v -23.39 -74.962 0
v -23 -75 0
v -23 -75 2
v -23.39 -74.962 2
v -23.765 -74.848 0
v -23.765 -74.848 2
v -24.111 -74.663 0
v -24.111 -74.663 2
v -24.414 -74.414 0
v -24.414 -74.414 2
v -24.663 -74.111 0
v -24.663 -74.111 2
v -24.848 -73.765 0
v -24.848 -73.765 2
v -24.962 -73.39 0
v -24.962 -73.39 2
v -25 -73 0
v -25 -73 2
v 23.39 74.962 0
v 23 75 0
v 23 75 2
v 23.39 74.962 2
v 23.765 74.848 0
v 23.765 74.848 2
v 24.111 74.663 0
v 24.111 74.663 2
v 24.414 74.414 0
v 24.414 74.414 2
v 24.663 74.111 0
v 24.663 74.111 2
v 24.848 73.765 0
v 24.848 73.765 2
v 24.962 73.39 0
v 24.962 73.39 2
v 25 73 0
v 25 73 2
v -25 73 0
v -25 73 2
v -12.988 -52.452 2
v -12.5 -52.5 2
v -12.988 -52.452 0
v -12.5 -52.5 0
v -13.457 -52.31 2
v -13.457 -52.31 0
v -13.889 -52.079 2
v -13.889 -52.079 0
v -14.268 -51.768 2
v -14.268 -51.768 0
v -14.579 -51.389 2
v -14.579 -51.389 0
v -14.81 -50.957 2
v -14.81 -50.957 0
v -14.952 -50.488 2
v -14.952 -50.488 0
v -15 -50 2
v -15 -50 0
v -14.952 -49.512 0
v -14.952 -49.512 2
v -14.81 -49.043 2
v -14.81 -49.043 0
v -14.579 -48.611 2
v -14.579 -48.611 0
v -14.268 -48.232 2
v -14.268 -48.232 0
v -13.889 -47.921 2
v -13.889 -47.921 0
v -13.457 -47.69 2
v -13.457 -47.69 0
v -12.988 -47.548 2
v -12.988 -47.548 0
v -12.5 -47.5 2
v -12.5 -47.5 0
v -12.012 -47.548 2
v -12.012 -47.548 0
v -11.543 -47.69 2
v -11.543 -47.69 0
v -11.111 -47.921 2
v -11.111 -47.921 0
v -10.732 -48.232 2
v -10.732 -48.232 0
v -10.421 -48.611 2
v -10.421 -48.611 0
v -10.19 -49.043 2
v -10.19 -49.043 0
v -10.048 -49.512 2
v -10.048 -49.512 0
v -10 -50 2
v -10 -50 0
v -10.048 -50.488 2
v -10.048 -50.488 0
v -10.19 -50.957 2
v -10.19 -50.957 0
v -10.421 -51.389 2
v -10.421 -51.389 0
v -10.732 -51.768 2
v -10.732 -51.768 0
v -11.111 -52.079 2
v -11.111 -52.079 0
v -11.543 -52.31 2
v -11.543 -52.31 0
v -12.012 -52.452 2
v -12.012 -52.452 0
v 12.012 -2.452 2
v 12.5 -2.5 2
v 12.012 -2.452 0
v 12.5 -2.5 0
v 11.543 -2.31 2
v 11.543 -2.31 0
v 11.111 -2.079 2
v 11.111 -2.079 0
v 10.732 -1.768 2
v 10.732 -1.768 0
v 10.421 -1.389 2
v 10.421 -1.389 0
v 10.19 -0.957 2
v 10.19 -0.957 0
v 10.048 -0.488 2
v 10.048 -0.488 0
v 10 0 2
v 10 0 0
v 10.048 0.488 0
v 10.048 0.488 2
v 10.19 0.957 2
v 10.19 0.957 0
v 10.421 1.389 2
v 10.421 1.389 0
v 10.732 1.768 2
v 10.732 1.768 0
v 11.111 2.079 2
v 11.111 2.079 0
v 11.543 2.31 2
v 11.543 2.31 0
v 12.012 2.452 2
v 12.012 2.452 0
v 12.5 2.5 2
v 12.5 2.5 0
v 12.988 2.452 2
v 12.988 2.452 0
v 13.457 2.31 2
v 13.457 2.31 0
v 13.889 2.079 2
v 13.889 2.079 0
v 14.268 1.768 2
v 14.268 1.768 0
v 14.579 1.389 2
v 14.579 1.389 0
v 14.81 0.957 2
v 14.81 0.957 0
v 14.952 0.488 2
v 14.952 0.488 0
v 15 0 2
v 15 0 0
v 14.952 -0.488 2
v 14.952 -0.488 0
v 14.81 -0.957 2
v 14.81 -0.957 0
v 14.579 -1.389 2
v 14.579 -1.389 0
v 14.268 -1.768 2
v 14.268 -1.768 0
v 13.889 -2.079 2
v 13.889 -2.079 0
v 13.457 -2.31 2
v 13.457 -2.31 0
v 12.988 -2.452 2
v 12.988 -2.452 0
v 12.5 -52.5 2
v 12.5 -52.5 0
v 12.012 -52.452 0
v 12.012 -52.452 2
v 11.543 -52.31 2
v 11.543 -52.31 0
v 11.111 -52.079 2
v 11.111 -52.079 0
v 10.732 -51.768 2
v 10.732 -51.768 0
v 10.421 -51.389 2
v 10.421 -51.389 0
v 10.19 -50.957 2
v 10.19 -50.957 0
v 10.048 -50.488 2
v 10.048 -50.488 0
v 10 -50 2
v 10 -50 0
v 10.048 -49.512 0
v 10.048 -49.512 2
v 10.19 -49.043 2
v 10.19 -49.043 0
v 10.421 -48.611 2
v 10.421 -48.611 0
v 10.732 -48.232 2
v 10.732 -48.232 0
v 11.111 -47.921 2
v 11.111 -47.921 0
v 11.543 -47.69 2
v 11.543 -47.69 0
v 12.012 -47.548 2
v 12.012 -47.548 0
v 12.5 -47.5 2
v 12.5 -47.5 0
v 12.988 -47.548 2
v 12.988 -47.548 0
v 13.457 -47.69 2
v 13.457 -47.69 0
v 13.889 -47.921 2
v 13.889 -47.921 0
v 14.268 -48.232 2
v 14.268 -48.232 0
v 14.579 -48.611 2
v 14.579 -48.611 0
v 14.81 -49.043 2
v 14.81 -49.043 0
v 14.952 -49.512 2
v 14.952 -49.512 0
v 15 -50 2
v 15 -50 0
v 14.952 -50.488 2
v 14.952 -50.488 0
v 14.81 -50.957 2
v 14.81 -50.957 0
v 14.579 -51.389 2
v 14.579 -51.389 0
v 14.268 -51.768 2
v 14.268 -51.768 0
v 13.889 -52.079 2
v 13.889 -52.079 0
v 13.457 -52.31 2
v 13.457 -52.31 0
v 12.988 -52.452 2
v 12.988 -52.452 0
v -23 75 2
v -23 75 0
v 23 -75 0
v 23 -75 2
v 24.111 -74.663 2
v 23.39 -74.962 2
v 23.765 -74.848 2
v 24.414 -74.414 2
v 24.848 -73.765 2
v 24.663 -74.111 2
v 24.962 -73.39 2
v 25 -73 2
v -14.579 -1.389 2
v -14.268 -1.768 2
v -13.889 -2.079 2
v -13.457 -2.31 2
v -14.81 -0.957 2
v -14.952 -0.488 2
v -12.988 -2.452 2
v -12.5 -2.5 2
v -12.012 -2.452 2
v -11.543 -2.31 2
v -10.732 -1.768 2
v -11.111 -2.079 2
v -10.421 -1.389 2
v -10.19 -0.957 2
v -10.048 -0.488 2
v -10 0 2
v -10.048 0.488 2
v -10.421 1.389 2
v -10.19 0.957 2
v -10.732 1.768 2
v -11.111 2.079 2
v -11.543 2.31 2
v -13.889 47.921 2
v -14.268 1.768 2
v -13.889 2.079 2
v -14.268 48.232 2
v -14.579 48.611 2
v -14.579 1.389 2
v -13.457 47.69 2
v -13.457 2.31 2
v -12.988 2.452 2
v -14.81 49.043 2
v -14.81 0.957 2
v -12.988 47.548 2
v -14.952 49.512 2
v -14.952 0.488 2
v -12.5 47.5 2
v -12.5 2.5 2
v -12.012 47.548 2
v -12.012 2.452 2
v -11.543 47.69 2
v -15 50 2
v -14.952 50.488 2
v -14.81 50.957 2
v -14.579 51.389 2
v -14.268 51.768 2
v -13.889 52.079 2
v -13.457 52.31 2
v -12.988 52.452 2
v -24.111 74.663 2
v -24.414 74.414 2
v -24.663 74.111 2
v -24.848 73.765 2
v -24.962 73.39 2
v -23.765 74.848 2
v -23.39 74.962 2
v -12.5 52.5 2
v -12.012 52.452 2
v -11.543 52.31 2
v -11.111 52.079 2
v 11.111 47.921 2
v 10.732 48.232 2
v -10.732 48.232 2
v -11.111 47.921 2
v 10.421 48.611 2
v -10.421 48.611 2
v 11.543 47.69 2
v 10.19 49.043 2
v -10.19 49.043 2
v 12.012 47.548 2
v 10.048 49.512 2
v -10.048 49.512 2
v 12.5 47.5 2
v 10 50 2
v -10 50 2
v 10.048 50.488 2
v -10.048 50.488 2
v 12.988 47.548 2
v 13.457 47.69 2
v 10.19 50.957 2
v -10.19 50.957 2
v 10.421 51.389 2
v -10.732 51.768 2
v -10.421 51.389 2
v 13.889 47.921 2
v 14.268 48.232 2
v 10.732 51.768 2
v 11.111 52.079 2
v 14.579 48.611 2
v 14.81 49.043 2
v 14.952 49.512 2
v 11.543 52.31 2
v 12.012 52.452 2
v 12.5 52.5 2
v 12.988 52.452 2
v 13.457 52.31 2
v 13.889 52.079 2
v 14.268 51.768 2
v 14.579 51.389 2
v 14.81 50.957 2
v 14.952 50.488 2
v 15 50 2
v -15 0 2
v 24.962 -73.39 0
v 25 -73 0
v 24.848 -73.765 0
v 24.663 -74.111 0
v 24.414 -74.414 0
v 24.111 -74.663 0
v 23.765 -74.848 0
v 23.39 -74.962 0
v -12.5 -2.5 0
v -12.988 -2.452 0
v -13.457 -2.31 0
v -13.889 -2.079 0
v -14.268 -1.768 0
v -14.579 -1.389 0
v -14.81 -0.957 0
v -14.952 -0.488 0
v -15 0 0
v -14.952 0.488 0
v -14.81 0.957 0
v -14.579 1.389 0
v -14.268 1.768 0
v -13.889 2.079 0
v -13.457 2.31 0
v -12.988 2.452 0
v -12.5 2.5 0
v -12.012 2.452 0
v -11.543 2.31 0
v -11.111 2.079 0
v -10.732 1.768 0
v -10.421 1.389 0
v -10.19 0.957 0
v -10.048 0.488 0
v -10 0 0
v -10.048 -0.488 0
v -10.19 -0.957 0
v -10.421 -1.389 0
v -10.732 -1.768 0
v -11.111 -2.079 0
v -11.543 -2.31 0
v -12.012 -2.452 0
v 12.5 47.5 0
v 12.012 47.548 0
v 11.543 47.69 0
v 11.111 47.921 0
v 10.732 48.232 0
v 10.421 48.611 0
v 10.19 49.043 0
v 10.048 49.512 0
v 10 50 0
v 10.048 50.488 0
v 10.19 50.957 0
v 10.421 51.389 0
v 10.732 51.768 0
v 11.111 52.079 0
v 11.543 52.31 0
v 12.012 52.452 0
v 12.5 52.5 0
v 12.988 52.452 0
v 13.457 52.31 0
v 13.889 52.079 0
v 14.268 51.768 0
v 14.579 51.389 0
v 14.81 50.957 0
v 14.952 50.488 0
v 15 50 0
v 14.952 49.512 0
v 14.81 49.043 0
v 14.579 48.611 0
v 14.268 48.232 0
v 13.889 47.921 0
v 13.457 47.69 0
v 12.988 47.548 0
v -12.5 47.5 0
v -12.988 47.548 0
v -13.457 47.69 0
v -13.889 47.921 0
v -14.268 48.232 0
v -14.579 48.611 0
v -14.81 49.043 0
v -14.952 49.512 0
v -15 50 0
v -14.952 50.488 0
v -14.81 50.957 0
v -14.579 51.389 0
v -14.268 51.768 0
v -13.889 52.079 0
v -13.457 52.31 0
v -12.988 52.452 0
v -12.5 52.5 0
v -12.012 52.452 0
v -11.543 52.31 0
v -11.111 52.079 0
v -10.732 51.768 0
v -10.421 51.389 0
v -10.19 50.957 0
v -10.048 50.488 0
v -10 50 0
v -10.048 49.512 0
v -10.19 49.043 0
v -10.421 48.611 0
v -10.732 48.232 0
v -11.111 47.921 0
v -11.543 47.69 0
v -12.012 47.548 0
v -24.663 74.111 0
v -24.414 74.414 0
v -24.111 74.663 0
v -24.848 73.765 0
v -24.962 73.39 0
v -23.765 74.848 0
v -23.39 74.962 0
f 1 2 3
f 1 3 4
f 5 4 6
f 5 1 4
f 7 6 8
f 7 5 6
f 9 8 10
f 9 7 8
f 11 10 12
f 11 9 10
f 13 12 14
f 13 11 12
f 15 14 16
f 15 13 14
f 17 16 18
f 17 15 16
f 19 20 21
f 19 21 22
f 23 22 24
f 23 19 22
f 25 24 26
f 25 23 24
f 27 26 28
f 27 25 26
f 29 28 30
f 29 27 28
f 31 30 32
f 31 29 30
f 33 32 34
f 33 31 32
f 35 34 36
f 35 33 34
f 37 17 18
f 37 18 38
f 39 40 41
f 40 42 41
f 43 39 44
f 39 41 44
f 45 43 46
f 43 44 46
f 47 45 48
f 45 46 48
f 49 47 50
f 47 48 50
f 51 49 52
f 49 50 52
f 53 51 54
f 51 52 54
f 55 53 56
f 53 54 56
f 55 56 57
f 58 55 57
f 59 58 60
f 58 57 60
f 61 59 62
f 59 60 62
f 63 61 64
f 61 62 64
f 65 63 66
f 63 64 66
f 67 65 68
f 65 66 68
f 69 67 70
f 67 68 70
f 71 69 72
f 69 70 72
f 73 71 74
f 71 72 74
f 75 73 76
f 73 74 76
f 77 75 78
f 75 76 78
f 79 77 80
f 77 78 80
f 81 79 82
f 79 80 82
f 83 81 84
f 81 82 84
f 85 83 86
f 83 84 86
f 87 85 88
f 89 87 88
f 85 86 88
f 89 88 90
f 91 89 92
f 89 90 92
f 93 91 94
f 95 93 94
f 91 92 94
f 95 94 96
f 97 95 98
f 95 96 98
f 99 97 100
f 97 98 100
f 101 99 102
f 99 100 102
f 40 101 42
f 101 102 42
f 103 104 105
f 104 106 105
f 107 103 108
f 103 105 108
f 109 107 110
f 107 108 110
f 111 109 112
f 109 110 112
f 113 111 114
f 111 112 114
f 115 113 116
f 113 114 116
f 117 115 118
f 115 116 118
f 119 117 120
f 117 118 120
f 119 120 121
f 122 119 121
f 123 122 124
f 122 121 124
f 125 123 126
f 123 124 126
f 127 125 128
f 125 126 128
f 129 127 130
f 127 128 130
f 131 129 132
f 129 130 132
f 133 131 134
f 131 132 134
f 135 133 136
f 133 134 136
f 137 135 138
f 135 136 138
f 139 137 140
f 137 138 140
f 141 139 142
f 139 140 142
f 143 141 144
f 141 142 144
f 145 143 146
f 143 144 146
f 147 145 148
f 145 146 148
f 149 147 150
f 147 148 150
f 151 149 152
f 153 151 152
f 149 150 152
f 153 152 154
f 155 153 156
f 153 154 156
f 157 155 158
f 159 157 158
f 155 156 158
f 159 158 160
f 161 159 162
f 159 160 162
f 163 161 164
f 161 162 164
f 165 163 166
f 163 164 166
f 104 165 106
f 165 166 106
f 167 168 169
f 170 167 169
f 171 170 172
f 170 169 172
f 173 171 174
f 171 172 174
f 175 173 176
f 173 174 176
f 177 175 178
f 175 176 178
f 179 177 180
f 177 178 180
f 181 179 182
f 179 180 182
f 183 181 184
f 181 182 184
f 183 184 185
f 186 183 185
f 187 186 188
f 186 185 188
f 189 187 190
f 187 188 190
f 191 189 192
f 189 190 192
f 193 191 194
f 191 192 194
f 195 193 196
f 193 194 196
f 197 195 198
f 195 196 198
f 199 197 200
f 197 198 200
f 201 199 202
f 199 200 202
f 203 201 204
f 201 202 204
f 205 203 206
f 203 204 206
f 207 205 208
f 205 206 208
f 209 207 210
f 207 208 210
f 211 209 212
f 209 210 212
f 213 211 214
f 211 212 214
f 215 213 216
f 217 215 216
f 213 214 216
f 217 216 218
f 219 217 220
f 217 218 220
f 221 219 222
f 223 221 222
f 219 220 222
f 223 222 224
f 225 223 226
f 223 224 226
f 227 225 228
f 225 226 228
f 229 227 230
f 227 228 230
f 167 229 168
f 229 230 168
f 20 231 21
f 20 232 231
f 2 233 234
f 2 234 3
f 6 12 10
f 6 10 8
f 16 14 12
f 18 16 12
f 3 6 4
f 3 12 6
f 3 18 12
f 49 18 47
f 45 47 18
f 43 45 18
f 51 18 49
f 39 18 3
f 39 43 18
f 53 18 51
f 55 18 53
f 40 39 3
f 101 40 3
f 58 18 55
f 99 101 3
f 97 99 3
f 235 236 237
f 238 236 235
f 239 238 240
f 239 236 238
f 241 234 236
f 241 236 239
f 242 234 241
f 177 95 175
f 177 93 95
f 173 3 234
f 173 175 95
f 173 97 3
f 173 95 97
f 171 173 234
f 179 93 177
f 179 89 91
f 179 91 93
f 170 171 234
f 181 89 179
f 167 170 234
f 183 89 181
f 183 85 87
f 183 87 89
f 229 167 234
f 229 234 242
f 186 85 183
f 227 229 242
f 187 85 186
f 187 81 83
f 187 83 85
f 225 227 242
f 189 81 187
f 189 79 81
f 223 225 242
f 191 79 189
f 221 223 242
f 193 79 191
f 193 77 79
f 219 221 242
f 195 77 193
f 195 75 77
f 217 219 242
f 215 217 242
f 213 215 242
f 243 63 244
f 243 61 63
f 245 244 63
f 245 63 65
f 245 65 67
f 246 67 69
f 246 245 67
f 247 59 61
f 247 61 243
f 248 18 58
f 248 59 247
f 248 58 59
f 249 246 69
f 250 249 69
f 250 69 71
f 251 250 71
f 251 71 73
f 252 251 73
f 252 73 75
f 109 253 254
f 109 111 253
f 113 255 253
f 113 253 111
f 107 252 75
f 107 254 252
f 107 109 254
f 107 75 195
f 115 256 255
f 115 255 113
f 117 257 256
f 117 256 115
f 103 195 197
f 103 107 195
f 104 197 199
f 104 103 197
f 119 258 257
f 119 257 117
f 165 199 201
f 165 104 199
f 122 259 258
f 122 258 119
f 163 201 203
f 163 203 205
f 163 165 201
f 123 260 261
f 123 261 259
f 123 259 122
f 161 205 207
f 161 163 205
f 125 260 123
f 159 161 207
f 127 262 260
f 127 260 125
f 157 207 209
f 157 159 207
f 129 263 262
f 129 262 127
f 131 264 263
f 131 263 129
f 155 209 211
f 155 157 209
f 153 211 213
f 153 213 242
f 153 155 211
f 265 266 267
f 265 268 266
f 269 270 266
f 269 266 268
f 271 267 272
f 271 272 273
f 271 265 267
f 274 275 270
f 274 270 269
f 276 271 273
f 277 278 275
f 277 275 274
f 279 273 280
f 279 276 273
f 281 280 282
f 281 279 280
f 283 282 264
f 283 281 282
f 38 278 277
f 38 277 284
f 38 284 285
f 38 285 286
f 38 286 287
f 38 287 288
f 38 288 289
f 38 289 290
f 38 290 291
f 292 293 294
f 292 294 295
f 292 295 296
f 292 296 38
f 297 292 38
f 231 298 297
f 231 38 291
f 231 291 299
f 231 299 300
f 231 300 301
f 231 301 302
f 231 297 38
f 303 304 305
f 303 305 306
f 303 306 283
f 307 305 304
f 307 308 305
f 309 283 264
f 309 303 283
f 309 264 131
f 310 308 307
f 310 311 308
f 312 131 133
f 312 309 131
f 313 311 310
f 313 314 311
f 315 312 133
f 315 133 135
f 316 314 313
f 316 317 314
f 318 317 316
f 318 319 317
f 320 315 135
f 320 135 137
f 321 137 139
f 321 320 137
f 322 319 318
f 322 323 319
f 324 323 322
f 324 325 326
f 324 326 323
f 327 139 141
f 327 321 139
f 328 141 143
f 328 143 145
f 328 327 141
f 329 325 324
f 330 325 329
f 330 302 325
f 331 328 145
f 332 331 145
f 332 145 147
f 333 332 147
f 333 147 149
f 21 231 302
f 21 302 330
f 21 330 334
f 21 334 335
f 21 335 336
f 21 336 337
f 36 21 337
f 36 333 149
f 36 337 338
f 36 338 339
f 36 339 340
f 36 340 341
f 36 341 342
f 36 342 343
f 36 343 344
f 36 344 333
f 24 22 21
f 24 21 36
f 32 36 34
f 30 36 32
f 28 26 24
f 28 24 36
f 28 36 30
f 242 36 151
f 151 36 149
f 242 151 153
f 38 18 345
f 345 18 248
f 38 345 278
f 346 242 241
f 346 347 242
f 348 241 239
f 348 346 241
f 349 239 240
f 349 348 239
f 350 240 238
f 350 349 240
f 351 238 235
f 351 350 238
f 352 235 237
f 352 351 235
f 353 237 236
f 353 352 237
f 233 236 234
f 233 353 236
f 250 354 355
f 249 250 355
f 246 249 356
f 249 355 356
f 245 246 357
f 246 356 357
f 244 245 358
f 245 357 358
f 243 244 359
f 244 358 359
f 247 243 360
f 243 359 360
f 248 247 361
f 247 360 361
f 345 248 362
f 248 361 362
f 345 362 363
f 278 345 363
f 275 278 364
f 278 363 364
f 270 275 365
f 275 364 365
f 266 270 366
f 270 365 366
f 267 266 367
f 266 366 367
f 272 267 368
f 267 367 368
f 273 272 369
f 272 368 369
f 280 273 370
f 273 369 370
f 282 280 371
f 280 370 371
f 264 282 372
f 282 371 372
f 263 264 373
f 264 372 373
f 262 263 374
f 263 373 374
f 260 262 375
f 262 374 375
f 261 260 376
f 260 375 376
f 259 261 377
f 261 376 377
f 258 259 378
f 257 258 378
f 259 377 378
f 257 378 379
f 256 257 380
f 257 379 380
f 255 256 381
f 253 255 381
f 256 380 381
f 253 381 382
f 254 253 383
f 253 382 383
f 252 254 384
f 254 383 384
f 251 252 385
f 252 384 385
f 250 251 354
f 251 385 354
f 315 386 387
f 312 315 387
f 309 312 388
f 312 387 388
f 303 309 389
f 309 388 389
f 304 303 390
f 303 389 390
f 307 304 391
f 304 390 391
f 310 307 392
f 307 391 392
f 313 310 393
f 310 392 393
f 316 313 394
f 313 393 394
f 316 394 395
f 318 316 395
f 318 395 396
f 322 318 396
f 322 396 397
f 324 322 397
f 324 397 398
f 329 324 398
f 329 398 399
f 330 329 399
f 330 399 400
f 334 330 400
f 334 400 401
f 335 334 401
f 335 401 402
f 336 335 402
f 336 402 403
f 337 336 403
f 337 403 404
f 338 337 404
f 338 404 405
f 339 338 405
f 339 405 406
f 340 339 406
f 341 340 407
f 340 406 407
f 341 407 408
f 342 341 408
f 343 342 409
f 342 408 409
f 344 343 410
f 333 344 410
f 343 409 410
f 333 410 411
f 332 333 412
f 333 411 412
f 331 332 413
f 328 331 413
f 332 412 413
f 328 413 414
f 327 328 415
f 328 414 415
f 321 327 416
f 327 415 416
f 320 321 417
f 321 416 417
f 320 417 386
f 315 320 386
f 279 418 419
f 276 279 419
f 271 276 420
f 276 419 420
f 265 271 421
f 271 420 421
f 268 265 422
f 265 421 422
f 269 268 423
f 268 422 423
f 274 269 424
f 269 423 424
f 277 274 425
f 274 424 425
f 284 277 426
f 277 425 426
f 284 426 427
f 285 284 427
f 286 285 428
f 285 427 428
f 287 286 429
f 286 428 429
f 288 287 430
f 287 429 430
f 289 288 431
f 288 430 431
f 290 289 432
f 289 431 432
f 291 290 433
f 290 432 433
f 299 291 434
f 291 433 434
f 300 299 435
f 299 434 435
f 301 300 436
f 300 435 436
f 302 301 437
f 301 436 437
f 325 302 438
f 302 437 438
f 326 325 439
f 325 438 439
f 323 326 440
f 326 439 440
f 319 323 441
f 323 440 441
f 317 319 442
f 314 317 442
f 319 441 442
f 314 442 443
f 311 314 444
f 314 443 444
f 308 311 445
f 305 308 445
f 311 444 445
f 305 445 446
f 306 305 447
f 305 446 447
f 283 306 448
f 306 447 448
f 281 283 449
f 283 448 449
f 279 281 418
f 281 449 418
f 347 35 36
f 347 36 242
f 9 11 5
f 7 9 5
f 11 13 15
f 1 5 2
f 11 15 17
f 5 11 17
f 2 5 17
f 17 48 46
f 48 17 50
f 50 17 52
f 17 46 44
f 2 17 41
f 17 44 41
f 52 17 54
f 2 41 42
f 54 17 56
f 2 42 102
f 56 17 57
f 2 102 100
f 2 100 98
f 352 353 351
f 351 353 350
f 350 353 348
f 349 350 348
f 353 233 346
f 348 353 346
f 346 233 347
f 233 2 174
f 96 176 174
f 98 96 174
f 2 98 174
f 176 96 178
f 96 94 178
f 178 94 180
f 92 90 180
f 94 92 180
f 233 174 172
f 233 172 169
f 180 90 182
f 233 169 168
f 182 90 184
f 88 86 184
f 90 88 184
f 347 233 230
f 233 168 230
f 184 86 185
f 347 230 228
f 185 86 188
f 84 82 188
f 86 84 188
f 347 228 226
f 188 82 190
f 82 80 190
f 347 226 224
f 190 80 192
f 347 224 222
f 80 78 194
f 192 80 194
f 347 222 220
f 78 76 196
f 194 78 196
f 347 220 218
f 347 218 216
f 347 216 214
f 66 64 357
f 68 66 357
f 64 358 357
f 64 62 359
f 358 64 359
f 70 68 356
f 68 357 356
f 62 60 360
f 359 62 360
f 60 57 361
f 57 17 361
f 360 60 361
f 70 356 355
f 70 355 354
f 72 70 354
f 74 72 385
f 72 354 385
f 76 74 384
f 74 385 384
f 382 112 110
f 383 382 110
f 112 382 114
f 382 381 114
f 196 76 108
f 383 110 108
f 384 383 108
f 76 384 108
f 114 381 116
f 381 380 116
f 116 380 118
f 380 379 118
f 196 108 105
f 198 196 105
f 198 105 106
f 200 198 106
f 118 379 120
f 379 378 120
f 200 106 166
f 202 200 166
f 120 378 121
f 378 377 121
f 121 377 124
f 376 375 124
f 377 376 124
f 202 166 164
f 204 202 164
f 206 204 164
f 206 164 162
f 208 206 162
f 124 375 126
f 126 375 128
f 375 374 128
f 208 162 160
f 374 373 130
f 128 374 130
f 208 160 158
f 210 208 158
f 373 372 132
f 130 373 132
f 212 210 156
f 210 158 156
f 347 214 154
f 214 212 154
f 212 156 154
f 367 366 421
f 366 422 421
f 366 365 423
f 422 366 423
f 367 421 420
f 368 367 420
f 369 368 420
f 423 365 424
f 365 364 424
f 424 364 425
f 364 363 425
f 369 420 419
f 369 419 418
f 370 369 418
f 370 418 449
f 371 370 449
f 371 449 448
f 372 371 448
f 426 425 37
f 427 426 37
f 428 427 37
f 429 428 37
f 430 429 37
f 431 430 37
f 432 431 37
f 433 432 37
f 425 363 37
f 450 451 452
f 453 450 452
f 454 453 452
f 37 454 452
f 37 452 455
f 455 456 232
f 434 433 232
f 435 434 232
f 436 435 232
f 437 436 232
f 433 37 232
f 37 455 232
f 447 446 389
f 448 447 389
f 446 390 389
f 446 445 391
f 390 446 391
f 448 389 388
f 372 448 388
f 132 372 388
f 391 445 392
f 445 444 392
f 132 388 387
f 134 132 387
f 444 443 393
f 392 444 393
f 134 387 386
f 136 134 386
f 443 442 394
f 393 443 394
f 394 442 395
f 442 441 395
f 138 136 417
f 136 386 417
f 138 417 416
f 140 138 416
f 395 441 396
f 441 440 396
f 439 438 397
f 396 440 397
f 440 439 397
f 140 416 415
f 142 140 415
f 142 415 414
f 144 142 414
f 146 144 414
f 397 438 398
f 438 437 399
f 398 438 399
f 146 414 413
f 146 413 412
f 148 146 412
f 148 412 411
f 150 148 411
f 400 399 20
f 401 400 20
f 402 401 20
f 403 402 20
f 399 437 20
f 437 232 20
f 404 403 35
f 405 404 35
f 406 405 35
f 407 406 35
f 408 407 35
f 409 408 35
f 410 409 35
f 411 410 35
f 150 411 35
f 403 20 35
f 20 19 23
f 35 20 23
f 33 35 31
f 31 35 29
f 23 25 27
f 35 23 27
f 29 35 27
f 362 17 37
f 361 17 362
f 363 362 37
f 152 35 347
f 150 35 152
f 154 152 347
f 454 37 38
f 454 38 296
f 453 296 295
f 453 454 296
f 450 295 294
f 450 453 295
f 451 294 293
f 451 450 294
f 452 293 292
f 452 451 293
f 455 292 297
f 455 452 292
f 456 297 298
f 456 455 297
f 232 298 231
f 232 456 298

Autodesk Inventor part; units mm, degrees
ref_plane "YZ Plane" through (0, 0, 0) normal (1, 0, 0) x (0, 1, 0)
ref_plane "XZ Plane" through (0, 0, 0) normal (0, 1, 0) x (-1, 0, 0)
ref_plane "XY Plane" through (0, 0, 0) normal (0, 0, 1) x (1, 0, 0)
sketch "Sketch1" plane through (0, 0, 0) normal (0, 0, 1) x (1, 0, 0)
  line L0 (-23, 75) -> (23, 75)
  line L1 (25, 73) -> (25, -73)
  line L2 (23, -75) -> (-23, -75)
  line L3 (-25, -73) -> (-25, 73)
  arc A0 (-23, 75) -> (-25, 73) centre (-23, 73) ccw
  arc A1 (25, 73) -> (23, 75) centre (23, 73) ccw
  arc A2 (23, -75) -> (25, -73) centre (23, -73) ccw
  arc A3 (-25, -73) -> (-23, -75) centre (-23, -73) ccw
  point P0 (0, 0)
  point P1 (-25, 75)
  point P2 (25, 75)
  point P3 (-25, -75)
  point P4 (-25, 0)
  dimension "d0" = 50
  dimension "d1" = 150
  dimension "d2" = 25
  dimension "d3" = 75
  dimension "d4" = 2
  dimension "d5" = 2
  dimension "d6" = 2
  dimension "d7" = 2
extrude "Extrusion1" add sketch "Sketch1" along normal blind 2
sketch "Sketch2" plane through (0, 0, 2) normal (0, 0, 1) x (1, 0, 0)
  line L0 (-64, 0) -> (59, 0)
  line L1 (0, 89) -> (0, -64)
  line L2 (-25, 73) -> (-25, -73) projected
  line L3 (23, 75) -> (-23, 75) projected
  point P0 (0, 0)
  point P1 (-12.5, 50)
  point P2 (-12.5, 0)
  point P3 (-12.5, -50)
  point P4 (12.5, 50)
  point P5 (12.5, 0)
  point P6 (12.5, -50)
  dimension "d12" = 50
  dimension "d15" = 25
  dimension "d18" = 12.5
  dimension "d19" = 25
hole "Hole1" at (-12.5, 50, 2) at (-12.5, 0, 2) at (-12.5, -50, 2) at (12.5, 50, 2) at (12.5, 0, 2) at (12.5, -50, 2) direction (0, 0, -1) diameter 5 end through all
properties part number "joint"
